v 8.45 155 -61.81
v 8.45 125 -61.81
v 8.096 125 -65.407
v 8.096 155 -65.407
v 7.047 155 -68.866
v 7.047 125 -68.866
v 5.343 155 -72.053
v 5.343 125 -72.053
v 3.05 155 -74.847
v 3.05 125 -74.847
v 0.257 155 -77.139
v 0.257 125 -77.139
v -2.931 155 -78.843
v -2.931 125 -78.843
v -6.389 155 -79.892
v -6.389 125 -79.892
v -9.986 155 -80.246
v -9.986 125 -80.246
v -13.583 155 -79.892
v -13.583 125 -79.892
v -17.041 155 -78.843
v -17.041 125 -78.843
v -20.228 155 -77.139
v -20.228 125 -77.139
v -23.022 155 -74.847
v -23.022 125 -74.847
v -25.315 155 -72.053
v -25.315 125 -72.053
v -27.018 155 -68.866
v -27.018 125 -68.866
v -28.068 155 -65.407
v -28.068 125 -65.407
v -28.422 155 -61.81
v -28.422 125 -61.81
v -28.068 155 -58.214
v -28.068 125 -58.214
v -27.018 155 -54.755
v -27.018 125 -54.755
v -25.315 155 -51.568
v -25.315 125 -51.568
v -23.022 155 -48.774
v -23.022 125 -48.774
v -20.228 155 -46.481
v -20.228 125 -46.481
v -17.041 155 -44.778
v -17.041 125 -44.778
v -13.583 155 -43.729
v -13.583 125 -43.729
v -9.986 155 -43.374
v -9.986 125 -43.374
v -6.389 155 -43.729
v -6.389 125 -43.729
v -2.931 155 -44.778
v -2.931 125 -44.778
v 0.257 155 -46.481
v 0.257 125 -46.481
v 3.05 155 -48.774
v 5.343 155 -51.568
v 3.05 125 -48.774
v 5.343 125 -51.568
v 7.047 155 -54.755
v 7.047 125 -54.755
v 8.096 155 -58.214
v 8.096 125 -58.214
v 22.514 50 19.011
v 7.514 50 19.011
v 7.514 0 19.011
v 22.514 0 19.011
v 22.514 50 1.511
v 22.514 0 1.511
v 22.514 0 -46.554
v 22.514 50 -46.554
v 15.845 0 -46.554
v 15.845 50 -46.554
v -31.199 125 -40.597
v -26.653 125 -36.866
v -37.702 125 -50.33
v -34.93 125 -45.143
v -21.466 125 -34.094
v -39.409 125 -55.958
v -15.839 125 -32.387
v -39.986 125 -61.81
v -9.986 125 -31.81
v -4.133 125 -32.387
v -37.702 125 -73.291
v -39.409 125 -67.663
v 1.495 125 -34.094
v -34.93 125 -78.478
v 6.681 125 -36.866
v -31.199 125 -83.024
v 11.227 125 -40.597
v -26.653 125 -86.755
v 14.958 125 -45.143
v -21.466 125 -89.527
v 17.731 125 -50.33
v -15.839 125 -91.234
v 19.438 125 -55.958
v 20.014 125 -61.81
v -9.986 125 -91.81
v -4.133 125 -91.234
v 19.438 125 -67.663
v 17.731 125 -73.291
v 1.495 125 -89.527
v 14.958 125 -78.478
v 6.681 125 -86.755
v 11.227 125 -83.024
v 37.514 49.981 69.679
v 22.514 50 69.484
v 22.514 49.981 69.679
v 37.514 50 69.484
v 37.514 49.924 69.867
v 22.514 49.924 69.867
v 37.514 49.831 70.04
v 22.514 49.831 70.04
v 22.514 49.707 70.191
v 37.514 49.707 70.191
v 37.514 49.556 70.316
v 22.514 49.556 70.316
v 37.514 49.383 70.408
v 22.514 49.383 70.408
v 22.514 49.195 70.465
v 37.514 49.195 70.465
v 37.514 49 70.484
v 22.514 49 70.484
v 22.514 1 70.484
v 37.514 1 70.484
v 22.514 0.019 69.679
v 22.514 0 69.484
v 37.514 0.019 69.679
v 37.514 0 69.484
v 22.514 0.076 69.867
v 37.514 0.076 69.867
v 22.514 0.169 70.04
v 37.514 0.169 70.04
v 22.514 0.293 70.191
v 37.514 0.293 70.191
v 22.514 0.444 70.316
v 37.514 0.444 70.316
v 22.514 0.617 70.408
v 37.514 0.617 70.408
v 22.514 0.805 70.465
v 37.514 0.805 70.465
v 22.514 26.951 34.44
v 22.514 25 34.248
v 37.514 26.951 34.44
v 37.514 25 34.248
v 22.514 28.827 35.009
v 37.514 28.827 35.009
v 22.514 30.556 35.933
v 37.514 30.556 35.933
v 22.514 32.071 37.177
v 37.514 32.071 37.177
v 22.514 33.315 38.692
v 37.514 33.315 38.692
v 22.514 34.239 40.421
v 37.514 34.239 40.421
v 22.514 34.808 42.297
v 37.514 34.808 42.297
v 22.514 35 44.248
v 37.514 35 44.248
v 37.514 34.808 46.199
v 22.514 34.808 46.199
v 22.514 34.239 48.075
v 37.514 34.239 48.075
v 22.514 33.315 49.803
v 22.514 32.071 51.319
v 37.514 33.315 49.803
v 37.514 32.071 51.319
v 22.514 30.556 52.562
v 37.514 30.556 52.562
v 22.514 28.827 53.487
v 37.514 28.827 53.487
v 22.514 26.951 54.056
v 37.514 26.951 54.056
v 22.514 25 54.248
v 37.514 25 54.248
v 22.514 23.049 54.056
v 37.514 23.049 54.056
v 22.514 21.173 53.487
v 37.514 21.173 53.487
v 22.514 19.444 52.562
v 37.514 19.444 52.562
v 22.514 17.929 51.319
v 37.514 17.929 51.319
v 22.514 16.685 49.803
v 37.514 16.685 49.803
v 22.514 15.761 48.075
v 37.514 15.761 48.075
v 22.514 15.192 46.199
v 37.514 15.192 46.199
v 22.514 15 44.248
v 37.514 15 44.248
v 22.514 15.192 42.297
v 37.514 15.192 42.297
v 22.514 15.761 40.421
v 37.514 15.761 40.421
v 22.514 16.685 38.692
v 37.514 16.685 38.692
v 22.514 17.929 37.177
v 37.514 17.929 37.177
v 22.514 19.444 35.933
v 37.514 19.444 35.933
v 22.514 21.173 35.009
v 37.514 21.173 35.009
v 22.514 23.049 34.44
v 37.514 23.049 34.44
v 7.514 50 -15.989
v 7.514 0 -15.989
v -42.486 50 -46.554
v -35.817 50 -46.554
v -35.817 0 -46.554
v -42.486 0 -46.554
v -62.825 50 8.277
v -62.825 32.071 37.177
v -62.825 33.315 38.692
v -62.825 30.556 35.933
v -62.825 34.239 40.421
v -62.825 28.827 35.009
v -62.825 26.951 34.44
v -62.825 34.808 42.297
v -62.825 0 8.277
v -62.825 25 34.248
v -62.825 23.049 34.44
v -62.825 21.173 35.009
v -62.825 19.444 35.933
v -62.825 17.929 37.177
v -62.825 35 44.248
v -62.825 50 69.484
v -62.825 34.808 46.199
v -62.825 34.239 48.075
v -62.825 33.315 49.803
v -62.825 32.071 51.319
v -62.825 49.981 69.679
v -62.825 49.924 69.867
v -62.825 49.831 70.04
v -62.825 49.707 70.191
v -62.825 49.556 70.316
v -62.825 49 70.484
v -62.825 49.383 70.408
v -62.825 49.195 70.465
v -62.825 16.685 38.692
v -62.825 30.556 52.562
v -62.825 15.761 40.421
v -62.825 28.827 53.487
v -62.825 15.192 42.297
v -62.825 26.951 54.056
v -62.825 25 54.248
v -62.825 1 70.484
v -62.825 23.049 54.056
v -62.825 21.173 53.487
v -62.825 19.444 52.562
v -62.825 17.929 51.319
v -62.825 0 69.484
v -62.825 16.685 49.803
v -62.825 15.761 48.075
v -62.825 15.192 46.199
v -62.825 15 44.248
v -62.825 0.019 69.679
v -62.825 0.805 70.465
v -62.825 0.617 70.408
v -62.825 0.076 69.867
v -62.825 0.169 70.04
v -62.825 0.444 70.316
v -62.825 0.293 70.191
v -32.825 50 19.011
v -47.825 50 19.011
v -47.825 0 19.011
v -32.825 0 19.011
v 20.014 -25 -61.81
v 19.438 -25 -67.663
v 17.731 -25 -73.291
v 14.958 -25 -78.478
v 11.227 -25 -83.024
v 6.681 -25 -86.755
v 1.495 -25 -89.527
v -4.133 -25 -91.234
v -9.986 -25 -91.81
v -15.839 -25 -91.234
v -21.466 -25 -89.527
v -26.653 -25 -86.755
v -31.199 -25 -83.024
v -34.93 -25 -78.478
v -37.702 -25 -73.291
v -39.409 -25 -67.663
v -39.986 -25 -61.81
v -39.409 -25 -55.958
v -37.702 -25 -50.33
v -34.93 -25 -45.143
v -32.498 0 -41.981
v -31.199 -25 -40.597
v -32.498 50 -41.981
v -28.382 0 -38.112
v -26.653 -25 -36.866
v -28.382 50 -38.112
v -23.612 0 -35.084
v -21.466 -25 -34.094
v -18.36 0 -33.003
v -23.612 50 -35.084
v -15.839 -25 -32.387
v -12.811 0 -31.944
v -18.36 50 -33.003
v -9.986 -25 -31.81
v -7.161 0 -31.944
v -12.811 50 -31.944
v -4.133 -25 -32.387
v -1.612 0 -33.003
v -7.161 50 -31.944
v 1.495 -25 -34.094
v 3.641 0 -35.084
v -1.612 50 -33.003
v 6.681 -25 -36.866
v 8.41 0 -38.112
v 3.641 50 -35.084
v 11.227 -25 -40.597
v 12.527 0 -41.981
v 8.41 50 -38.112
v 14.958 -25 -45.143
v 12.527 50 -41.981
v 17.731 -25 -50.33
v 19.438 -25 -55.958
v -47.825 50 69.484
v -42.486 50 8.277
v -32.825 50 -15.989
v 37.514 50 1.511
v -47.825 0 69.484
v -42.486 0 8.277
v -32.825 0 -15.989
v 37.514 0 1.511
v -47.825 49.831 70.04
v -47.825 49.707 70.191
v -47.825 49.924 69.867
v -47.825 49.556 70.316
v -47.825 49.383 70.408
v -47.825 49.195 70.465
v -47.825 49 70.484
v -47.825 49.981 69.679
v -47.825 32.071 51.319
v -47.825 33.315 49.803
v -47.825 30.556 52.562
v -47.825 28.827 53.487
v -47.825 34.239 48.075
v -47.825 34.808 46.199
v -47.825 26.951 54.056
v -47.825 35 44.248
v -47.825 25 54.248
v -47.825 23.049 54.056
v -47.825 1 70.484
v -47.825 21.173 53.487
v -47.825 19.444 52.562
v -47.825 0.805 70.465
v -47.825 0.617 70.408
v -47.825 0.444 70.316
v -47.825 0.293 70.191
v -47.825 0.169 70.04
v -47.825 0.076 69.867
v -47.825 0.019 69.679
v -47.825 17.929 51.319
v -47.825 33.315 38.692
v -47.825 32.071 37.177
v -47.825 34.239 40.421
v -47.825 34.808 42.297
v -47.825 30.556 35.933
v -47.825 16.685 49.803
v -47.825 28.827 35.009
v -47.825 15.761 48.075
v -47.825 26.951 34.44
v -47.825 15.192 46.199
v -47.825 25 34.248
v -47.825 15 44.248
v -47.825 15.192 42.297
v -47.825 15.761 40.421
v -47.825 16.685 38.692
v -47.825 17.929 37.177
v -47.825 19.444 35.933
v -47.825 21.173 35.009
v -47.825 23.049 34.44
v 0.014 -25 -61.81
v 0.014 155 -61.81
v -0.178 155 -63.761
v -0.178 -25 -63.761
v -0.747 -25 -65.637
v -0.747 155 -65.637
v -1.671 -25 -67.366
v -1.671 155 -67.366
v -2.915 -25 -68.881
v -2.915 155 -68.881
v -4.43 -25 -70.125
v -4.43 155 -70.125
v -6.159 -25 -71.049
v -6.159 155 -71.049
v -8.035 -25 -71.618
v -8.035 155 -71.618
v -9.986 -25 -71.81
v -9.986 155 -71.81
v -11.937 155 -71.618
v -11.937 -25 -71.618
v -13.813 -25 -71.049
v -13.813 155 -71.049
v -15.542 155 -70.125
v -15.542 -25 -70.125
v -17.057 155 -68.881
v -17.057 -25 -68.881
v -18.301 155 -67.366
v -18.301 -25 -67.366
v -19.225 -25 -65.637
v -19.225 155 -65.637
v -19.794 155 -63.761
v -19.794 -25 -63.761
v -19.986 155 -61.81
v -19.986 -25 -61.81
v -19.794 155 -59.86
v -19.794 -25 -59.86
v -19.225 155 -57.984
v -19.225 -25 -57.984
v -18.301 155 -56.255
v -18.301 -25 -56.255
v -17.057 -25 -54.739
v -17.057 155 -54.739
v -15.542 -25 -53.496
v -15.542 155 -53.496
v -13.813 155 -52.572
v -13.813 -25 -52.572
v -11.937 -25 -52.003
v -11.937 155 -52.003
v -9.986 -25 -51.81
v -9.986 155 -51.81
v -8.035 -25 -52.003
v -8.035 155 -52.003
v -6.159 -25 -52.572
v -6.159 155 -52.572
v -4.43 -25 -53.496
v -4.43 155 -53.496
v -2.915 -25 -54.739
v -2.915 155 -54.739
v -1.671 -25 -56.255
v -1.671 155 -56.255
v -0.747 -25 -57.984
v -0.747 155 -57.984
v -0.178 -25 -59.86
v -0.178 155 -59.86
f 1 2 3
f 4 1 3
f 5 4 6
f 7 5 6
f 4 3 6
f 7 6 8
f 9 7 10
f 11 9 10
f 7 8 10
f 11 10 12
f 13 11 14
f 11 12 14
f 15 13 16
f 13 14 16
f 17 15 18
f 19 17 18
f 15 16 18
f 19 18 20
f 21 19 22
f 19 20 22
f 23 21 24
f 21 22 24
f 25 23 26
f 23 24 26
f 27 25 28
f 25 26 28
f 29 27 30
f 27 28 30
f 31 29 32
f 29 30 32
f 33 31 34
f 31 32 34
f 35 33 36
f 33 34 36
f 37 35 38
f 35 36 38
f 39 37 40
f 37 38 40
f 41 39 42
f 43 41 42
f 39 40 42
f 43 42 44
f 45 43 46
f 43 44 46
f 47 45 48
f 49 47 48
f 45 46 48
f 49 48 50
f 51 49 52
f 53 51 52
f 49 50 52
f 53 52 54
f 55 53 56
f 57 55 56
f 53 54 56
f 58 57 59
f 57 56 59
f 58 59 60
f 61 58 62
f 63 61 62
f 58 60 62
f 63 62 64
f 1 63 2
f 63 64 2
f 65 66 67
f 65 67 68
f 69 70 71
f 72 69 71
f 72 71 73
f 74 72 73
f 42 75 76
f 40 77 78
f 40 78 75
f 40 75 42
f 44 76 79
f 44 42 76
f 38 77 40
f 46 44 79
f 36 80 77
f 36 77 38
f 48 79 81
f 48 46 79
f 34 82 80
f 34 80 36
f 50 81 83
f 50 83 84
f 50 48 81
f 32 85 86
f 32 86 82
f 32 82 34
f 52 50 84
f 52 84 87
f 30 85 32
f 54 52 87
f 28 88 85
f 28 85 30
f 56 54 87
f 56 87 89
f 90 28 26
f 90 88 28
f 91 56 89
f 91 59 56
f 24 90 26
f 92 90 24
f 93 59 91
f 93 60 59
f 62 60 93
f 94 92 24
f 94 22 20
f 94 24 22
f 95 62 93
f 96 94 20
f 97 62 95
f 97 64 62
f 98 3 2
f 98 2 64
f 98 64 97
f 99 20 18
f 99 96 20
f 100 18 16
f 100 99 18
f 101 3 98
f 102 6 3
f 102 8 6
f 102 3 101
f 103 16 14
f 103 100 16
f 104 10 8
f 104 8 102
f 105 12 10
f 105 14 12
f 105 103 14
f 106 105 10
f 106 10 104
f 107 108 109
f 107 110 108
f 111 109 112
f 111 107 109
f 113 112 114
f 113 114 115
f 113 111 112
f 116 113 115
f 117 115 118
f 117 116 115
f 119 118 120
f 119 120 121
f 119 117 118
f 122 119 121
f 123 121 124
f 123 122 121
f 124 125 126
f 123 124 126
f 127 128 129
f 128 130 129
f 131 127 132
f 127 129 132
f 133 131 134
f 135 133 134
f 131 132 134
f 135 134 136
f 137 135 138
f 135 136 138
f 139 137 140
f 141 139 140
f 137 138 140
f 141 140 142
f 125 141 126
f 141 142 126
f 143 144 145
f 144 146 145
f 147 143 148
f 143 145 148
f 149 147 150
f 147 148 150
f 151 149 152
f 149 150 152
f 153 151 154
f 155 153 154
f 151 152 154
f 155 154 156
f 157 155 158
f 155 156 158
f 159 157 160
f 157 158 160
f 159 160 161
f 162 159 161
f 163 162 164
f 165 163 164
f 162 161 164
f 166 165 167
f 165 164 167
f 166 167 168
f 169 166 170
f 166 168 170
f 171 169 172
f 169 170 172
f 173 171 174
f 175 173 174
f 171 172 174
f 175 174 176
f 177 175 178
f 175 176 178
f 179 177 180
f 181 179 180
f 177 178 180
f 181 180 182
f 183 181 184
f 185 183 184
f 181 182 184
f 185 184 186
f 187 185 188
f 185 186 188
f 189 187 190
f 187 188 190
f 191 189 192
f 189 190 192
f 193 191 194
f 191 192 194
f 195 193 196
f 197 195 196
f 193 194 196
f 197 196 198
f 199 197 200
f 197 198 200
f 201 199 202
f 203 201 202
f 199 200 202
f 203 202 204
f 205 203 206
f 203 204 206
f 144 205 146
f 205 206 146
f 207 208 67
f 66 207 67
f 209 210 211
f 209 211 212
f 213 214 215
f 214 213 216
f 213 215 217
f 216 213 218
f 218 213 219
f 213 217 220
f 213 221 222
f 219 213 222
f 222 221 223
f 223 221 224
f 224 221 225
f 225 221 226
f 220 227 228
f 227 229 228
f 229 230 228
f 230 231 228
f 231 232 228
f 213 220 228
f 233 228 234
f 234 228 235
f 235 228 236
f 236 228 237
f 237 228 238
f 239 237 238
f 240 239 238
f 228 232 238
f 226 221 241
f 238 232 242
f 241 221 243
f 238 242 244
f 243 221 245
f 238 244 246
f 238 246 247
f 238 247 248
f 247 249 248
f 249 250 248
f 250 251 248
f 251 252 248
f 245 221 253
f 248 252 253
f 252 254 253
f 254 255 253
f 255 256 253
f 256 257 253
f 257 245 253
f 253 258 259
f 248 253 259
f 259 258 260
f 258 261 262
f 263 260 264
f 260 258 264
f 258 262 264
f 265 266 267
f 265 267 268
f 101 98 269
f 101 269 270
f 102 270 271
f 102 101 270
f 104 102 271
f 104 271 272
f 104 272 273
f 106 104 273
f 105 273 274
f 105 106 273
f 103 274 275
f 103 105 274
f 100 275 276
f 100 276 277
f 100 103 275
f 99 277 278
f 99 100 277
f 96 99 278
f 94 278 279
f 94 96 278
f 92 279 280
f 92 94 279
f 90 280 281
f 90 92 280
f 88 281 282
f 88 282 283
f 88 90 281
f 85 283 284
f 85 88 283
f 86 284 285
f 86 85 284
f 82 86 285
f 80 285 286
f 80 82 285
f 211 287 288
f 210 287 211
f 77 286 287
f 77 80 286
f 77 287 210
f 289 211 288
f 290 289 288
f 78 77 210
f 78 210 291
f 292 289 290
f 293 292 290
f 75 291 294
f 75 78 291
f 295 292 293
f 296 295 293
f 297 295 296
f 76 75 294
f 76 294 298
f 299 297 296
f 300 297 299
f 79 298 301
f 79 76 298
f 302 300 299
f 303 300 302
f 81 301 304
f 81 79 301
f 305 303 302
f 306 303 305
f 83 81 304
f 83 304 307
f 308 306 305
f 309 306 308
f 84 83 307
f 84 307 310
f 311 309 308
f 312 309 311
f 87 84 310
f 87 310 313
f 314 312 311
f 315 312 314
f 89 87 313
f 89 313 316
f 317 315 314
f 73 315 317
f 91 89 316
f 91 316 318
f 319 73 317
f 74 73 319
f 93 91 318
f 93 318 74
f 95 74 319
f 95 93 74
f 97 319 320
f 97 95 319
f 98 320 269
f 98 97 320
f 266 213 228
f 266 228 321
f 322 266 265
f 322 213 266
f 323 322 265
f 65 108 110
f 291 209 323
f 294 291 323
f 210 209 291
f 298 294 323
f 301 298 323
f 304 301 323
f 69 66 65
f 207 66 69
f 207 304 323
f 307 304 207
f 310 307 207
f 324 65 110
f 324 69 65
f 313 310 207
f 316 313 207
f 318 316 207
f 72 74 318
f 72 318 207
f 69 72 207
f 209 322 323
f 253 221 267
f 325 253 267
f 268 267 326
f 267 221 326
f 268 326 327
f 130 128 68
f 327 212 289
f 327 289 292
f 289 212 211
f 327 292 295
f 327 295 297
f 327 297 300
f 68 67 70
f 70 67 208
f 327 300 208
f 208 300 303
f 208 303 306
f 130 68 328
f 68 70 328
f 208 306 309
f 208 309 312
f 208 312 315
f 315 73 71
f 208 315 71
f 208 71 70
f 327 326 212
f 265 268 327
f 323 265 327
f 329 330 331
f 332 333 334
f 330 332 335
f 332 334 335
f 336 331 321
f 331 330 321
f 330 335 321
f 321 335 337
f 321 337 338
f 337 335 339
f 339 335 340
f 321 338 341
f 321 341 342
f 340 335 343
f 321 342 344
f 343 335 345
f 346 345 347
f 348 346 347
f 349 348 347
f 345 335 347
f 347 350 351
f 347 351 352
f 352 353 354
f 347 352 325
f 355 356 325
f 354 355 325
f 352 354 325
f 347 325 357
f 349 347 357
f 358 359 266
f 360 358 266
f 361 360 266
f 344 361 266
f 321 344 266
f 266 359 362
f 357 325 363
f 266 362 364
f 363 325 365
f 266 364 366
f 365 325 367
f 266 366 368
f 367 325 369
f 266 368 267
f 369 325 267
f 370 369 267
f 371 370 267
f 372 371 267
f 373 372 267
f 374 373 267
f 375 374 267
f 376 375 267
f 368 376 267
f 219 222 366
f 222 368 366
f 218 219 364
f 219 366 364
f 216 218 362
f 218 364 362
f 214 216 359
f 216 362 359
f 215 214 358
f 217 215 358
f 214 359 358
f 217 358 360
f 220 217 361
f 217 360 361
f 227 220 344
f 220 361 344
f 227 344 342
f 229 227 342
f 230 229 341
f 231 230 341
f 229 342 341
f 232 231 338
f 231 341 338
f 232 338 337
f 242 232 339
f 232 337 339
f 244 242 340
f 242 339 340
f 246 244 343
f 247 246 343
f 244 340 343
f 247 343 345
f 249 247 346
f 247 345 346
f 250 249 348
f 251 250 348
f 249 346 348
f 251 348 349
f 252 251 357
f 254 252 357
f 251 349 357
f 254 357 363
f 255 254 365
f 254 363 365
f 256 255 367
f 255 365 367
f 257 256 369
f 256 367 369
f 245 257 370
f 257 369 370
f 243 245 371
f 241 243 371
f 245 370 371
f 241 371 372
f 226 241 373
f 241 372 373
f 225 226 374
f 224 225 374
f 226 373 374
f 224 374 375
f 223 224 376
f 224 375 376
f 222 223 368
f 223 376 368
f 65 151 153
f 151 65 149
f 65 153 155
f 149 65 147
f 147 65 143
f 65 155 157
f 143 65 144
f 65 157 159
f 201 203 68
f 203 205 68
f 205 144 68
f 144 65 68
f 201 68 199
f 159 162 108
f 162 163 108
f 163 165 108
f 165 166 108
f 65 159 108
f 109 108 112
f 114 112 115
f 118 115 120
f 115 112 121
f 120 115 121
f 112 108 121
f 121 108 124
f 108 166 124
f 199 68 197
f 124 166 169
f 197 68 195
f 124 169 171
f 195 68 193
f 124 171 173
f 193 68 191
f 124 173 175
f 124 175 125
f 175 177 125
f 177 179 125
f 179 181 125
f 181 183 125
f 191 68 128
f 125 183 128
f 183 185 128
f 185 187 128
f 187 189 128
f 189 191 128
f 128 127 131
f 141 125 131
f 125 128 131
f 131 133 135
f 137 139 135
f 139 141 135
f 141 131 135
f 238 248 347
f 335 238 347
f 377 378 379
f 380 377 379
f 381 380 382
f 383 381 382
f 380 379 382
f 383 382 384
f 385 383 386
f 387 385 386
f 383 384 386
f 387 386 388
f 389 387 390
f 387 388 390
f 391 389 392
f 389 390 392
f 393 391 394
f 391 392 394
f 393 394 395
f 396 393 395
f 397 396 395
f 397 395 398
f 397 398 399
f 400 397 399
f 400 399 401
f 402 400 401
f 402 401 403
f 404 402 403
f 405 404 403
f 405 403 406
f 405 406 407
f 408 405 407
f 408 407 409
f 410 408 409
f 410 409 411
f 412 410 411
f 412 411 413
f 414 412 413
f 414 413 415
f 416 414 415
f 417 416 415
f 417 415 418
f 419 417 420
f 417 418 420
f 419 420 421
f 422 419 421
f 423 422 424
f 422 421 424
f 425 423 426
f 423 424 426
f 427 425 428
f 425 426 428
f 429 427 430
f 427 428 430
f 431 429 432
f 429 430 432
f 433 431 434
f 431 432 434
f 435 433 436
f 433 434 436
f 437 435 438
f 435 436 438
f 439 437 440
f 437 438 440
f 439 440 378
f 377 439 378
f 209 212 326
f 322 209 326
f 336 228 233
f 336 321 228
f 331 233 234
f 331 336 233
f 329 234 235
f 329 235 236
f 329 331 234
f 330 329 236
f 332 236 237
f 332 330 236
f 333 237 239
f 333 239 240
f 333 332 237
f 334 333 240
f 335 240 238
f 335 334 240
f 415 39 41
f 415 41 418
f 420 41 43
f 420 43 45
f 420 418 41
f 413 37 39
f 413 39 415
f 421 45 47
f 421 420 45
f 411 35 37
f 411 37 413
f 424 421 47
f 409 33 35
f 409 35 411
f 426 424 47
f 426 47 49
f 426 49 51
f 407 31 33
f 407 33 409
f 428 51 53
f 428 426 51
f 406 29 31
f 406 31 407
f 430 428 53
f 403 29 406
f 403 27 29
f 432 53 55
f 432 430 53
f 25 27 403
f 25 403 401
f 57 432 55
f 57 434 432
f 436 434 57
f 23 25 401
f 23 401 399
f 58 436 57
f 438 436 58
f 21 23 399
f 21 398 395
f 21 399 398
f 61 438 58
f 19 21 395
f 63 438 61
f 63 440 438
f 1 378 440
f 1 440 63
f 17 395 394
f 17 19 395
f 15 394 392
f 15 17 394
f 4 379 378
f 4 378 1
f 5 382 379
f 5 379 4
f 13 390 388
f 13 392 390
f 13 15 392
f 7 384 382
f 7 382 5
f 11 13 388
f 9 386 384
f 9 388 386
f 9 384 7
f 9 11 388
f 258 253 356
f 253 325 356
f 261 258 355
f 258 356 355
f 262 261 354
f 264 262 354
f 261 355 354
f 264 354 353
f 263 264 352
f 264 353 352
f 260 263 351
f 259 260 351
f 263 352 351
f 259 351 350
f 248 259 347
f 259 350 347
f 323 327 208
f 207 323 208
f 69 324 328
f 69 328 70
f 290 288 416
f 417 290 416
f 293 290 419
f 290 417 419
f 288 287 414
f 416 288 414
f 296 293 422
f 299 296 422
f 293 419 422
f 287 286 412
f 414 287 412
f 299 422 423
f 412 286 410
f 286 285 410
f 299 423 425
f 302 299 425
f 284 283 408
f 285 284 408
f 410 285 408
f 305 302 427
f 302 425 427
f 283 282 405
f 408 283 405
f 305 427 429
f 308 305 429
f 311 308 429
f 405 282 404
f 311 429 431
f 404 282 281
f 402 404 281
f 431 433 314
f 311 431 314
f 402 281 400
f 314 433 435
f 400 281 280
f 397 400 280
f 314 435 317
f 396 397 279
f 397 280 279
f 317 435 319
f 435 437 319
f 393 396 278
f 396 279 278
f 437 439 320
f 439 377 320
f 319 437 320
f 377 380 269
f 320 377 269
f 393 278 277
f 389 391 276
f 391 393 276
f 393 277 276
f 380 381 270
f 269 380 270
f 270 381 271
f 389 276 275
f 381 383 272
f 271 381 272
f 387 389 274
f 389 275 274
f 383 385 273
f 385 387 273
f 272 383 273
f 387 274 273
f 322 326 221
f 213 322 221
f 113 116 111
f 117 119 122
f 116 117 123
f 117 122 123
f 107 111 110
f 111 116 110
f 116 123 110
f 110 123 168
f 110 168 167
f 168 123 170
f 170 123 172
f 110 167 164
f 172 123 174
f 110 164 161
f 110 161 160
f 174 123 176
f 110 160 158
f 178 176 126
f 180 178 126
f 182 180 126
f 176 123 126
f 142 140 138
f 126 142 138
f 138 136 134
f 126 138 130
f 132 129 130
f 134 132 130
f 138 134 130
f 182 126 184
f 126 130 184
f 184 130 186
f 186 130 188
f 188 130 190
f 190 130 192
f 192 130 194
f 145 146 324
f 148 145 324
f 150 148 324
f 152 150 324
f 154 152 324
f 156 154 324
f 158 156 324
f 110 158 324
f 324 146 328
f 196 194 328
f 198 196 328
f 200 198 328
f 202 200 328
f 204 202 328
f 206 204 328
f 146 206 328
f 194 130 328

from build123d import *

# Parameters (mm, degrees)
BOSS_EXTRUDE1_DEPTH = 50
SKETCH2_R           = 30
BOSS_EXTRUDE2_DEPTH = 75
SKETCH3_R           = 18.435978865
BOSS_EXTRUDE3_DEPTH = 30
SKETCH4_R           = 10
CUT_EXTRUDE1_DEPTH  = 220
FILLET1_R           = 1
SKETCH6_R           = 10
CUT_EXTRUDE3_DEPTH  = 110


with BuildPart() as part:
    # Sketch1 → Boss-Extrude1 (new body)
    with BuildSketch(Plane(origin=(0, 0, 0), x_dir=(1, 0, 0), z_dir=(0, 1, 0))):
        Polygon((-42.485875706, 40.677966102), (-42.485875706, -8.276836158), (-62.824858757, -8.276836158), (-62.824858757, -39.011299435), (-62.824858757, -70.484281789), (-47.824858757, -70.484281789), (-47.824858757, -19.011299435), (-32.824858757, -19.011299435), (-32.824858757, 15.988700565), (7.514124294, 15.988700565), (7.514124294, -19.011299435), (22.514124294, -19.011299435), (22.514124294, -70.484281789), (37.514124294, -70.484281789), (37.514124294, -39.011299435), (37.514124294, -1.511299435), (22.514124294, -1.511299435), (22.514124294, 46.553672316), (-42.485875706, 46.553672316), align=None)
    extrude(amount=BOSS_EXTRUDE1_DEPTH)

    # Sketch2 → Boss-Extrude2 (add, symmetric)
    with BuildSketch(Plane(origin=(0, 50, 0), x_dir=(1, 0, 0), z_dir=(0, 1, 0))):
        with Locations((-9.985875706, 61.810417825)):
            Circle(SKETCH2_R)
    extrude(amount=BOSS_EXTRUDE2_DEPTH, both=True)

    # Sketch3 → Boss-Extrude3 (add)
    with BuildSketch(Plane(origin=(0, 125, 0), x_dir=(1, 0, 0), z_dir=(0, 1, 0))):
        with Locations((-9.985875706, 61.810417825)):
            Circle(SKETCH3_R)
    extrude(amount=BOSS_EXTRUDE3_DEPTH)

    # Sketch4 → Cut-Extrude1 (cut)
    with BuildSketch(Plane(origin=(0, 155, 0), x_dir=(1, 0, 0), z_dir=(0, 1, 0))):
        with Locations((-9.985875706, 61.810417825)):
            Circle(SKETCH4_R)
    extrude(amount=-CUT_EXTRUDE1_DEPTH, mode=Mode.SUBTRACT)

    # Fillet1
    fillet1_edges = [part.edges().sort_by_distance(p)[0] for p in [
        (30.014124294, 0, 70.484281789),
        (-55.324858757, 0, 70.484281789),
        (-55.324858757, 50, 70.484281789),
        (30.014124294, 50, 70.484281789),
    ]]
    fillet(fillet1_edges, radius=FILLET1_R)

    # Sketch6 → Cut-Extrude3 (cut, symmetric)
    with BuildSketch(Plane(origin=(-47.824858757, 0, 0), x_dir=(0, 0, -1), z_dir=(1, 0, 0))):
        with Locations((-44.247790612, 25)):
            Circle(SKETCH6_R)
    extrude(amount=CUT_EXTRUDE3_DEPTH, both=True, mode=Mode.SUBTRACT)


solid = part.part
